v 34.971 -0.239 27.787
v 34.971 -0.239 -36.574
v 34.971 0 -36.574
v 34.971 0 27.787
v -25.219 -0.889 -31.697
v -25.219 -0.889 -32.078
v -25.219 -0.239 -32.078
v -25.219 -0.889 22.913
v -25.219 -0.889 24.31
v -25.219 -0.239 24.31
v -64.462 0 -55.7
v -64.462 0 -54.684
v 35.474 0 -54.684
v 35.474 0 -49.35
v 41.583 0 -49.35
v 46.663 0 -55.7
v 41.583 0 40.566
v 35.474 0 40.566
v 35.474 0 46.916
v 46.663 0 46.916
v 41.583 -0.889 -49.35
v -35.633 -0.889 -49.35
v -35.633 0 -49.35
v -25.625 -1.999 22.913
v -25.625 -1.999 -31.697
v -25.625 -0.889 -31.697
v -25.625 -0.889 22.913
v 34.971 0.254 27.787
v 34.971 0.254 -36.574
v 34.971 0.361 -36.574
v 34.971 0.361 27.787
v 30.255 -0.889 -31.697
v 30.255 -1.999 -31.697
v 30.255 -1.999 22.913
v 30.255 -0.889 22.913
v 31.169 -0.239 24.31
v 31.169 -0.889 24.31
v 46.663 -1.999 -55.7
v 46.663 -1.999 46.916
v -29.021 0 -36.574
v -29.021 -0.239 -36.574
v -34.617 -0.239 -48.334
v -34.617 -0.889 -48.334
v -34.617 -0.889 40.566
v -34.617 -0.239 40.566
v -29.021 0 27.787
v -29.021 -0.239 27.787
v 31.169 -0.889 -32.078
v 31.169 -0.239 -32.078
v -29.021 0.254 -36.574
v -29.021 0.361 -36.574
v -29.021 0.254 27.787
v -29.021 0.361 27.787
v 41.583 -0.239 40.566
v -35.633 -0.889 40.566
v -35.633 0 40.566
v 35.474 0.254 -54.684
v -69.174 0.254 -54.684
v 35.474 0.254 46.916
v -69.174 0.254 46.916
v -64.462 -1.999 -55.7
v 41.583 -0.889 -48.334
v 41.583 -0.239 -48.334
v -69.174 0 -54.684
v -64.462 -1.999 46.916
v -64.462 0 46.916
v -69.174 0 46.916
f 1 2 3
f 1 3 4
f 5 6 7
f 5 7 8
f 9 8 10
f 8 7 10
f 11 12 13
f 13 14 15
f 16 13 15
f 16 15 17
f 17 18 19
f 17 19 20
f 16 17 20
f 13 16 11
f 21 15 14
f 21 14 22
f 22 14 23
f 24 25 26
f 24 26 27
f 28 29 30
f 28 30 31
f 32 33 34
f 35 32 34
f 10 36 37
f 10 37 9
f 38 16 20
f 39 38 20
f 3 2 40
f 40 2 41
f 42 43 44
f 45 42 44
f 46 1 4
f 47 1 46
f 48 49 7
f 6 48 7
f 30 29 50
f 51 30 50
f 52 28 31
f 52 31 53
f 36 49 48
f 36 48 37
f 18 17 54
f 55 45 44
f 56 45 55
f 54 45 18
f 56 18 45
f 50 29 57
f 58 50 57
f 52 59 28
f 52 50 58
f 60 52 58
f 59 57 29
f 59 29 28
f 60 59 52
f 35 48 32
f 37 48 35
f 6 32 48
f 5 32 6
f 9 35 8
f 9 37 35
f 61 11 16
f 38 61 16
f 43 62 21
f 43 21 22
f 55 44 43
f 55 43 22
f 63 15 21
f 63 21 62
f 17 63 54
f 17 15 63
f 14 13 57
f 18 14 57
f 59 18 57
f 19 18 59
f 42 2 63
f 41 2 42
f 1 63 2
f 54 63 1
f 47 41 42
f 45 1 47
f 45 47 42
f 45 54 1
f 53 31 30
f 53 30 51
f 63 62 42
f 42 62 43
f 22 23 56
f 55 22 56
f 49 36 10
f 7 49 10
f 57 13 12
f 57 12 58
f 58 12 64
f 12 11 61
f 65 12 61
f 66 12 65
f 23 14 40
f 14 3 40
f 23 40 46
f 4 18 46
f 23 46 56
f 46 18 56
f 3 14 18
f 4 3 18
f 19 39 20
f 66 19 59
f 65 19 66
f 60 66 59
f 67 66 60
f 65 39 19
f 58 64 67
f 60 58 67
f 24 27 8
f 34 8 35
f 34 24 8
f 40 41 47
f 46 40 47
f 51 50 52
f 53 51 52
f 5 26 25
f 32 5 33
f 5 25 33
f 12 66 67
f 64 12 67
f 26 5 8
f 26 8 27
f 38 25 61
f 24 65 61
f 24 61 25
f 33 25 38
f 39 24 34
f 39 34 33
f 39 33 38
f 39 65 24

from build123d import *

# Parameters (mm, degrees)
F0_W      = 111.125
F0_H      = 102.616
F1_DEPTH  = 1.99898
F2_W      = 55.88
F2_H      = 54.61
F3_DEPTH  = 1.10998
F4_W      = 77.216
F4_H      = 89.916
F5_DEPTH  = 0.889
F6_W      = 76.2
F6_H      = 88.9
F7_DEPTH  = 0.65024
F8_W      = 56.388
F8_H      = 56.388
F9_DEPTH  = 0.65024
F10_W     = 63.99276
F10_H     = 64.36106
F11_DEPTH = 0.59944
F12_W     = 104.648
F12_H     = 101.6
F13_DEPTH = 0.254


with BuildPart() as f1:
    # F0 (on Front) → F1 (new body)
    with BuildSketch(Plane.XZ):
        with Locations((-8.899393, -4.392473)):
            Rectangle(F0_W, F0_H)
    extrude(amount=F1_DEPTH)

    # F2 (on face) → F3 (cut)
    with BuildSketch(Plane.XZ.offset(1.99898)):
        with Locations((2.314707, -4.392473)):
            Rectangle(F2_W, F2_H)
    extrude(amount=-F3_DEPTH, mode=Mode.SUBTRACT)

    # F4 (on face) → F5 (cut)
    with BuildSketch(Plane(origin=(0, 0, 0), x_dir=(-1, 0, 0), z_dir=(0, 1, 0))):
        with Locations((-2.975107, -4.392473)):
            Rectangle(F4_W, F4_H)
    extrude(amount=-F5_DEPTH, mode=Mode.SUBTRACT)

    # F6 (on face) → F7 (join)
    with BuildSketch(Plane(origin=(0, -0.889, 0), x_dir=(-1, 0, 0), z_dir=(0, 1, 0))):
        with Locations((-3.483107, -3.884473)):
            Rectangle(F6_W, F6_H)
    extrude(amount=F7_DEPTH)

    # F8 (on face) → F9 (cut)
    with BuildSketch(Plane(origin=(0, -0.23876, 0), x_dir=(-1, 0, 0), z_dir=(0, 1, 0))):
        with Locations((-2.975107, -3.884473)):
            Rectangle(F8_W, F8_H)
    extrude(amount=-F9_DEPTH, mode=Mode.SUBTRACT)

    # F10 (on face) → F11 (join)
    with BuildSketch(Plane(origin=(0, -0.23876, 0), x_dir=(-1, 0, 0), z_dir=(0, 1, 0))):
        with Locations((-2.975107, -4.393743)):
            Rectangle(F10_W, F10_H)
    extrude(amount=F11_DEPTH)

    # F12 (on face) → F13 (join)
    with BuildSketch(Plane(origin=(0, 0, 0), x_dir=(-1, 0, 0), z_dir=(0, 1, 0))):
        with Locations((16.849593, -3.884473)):
            Rectangle(F12_W, F12_H)
    extrude(amount=F13_DEPTH)


solid = f1.part
